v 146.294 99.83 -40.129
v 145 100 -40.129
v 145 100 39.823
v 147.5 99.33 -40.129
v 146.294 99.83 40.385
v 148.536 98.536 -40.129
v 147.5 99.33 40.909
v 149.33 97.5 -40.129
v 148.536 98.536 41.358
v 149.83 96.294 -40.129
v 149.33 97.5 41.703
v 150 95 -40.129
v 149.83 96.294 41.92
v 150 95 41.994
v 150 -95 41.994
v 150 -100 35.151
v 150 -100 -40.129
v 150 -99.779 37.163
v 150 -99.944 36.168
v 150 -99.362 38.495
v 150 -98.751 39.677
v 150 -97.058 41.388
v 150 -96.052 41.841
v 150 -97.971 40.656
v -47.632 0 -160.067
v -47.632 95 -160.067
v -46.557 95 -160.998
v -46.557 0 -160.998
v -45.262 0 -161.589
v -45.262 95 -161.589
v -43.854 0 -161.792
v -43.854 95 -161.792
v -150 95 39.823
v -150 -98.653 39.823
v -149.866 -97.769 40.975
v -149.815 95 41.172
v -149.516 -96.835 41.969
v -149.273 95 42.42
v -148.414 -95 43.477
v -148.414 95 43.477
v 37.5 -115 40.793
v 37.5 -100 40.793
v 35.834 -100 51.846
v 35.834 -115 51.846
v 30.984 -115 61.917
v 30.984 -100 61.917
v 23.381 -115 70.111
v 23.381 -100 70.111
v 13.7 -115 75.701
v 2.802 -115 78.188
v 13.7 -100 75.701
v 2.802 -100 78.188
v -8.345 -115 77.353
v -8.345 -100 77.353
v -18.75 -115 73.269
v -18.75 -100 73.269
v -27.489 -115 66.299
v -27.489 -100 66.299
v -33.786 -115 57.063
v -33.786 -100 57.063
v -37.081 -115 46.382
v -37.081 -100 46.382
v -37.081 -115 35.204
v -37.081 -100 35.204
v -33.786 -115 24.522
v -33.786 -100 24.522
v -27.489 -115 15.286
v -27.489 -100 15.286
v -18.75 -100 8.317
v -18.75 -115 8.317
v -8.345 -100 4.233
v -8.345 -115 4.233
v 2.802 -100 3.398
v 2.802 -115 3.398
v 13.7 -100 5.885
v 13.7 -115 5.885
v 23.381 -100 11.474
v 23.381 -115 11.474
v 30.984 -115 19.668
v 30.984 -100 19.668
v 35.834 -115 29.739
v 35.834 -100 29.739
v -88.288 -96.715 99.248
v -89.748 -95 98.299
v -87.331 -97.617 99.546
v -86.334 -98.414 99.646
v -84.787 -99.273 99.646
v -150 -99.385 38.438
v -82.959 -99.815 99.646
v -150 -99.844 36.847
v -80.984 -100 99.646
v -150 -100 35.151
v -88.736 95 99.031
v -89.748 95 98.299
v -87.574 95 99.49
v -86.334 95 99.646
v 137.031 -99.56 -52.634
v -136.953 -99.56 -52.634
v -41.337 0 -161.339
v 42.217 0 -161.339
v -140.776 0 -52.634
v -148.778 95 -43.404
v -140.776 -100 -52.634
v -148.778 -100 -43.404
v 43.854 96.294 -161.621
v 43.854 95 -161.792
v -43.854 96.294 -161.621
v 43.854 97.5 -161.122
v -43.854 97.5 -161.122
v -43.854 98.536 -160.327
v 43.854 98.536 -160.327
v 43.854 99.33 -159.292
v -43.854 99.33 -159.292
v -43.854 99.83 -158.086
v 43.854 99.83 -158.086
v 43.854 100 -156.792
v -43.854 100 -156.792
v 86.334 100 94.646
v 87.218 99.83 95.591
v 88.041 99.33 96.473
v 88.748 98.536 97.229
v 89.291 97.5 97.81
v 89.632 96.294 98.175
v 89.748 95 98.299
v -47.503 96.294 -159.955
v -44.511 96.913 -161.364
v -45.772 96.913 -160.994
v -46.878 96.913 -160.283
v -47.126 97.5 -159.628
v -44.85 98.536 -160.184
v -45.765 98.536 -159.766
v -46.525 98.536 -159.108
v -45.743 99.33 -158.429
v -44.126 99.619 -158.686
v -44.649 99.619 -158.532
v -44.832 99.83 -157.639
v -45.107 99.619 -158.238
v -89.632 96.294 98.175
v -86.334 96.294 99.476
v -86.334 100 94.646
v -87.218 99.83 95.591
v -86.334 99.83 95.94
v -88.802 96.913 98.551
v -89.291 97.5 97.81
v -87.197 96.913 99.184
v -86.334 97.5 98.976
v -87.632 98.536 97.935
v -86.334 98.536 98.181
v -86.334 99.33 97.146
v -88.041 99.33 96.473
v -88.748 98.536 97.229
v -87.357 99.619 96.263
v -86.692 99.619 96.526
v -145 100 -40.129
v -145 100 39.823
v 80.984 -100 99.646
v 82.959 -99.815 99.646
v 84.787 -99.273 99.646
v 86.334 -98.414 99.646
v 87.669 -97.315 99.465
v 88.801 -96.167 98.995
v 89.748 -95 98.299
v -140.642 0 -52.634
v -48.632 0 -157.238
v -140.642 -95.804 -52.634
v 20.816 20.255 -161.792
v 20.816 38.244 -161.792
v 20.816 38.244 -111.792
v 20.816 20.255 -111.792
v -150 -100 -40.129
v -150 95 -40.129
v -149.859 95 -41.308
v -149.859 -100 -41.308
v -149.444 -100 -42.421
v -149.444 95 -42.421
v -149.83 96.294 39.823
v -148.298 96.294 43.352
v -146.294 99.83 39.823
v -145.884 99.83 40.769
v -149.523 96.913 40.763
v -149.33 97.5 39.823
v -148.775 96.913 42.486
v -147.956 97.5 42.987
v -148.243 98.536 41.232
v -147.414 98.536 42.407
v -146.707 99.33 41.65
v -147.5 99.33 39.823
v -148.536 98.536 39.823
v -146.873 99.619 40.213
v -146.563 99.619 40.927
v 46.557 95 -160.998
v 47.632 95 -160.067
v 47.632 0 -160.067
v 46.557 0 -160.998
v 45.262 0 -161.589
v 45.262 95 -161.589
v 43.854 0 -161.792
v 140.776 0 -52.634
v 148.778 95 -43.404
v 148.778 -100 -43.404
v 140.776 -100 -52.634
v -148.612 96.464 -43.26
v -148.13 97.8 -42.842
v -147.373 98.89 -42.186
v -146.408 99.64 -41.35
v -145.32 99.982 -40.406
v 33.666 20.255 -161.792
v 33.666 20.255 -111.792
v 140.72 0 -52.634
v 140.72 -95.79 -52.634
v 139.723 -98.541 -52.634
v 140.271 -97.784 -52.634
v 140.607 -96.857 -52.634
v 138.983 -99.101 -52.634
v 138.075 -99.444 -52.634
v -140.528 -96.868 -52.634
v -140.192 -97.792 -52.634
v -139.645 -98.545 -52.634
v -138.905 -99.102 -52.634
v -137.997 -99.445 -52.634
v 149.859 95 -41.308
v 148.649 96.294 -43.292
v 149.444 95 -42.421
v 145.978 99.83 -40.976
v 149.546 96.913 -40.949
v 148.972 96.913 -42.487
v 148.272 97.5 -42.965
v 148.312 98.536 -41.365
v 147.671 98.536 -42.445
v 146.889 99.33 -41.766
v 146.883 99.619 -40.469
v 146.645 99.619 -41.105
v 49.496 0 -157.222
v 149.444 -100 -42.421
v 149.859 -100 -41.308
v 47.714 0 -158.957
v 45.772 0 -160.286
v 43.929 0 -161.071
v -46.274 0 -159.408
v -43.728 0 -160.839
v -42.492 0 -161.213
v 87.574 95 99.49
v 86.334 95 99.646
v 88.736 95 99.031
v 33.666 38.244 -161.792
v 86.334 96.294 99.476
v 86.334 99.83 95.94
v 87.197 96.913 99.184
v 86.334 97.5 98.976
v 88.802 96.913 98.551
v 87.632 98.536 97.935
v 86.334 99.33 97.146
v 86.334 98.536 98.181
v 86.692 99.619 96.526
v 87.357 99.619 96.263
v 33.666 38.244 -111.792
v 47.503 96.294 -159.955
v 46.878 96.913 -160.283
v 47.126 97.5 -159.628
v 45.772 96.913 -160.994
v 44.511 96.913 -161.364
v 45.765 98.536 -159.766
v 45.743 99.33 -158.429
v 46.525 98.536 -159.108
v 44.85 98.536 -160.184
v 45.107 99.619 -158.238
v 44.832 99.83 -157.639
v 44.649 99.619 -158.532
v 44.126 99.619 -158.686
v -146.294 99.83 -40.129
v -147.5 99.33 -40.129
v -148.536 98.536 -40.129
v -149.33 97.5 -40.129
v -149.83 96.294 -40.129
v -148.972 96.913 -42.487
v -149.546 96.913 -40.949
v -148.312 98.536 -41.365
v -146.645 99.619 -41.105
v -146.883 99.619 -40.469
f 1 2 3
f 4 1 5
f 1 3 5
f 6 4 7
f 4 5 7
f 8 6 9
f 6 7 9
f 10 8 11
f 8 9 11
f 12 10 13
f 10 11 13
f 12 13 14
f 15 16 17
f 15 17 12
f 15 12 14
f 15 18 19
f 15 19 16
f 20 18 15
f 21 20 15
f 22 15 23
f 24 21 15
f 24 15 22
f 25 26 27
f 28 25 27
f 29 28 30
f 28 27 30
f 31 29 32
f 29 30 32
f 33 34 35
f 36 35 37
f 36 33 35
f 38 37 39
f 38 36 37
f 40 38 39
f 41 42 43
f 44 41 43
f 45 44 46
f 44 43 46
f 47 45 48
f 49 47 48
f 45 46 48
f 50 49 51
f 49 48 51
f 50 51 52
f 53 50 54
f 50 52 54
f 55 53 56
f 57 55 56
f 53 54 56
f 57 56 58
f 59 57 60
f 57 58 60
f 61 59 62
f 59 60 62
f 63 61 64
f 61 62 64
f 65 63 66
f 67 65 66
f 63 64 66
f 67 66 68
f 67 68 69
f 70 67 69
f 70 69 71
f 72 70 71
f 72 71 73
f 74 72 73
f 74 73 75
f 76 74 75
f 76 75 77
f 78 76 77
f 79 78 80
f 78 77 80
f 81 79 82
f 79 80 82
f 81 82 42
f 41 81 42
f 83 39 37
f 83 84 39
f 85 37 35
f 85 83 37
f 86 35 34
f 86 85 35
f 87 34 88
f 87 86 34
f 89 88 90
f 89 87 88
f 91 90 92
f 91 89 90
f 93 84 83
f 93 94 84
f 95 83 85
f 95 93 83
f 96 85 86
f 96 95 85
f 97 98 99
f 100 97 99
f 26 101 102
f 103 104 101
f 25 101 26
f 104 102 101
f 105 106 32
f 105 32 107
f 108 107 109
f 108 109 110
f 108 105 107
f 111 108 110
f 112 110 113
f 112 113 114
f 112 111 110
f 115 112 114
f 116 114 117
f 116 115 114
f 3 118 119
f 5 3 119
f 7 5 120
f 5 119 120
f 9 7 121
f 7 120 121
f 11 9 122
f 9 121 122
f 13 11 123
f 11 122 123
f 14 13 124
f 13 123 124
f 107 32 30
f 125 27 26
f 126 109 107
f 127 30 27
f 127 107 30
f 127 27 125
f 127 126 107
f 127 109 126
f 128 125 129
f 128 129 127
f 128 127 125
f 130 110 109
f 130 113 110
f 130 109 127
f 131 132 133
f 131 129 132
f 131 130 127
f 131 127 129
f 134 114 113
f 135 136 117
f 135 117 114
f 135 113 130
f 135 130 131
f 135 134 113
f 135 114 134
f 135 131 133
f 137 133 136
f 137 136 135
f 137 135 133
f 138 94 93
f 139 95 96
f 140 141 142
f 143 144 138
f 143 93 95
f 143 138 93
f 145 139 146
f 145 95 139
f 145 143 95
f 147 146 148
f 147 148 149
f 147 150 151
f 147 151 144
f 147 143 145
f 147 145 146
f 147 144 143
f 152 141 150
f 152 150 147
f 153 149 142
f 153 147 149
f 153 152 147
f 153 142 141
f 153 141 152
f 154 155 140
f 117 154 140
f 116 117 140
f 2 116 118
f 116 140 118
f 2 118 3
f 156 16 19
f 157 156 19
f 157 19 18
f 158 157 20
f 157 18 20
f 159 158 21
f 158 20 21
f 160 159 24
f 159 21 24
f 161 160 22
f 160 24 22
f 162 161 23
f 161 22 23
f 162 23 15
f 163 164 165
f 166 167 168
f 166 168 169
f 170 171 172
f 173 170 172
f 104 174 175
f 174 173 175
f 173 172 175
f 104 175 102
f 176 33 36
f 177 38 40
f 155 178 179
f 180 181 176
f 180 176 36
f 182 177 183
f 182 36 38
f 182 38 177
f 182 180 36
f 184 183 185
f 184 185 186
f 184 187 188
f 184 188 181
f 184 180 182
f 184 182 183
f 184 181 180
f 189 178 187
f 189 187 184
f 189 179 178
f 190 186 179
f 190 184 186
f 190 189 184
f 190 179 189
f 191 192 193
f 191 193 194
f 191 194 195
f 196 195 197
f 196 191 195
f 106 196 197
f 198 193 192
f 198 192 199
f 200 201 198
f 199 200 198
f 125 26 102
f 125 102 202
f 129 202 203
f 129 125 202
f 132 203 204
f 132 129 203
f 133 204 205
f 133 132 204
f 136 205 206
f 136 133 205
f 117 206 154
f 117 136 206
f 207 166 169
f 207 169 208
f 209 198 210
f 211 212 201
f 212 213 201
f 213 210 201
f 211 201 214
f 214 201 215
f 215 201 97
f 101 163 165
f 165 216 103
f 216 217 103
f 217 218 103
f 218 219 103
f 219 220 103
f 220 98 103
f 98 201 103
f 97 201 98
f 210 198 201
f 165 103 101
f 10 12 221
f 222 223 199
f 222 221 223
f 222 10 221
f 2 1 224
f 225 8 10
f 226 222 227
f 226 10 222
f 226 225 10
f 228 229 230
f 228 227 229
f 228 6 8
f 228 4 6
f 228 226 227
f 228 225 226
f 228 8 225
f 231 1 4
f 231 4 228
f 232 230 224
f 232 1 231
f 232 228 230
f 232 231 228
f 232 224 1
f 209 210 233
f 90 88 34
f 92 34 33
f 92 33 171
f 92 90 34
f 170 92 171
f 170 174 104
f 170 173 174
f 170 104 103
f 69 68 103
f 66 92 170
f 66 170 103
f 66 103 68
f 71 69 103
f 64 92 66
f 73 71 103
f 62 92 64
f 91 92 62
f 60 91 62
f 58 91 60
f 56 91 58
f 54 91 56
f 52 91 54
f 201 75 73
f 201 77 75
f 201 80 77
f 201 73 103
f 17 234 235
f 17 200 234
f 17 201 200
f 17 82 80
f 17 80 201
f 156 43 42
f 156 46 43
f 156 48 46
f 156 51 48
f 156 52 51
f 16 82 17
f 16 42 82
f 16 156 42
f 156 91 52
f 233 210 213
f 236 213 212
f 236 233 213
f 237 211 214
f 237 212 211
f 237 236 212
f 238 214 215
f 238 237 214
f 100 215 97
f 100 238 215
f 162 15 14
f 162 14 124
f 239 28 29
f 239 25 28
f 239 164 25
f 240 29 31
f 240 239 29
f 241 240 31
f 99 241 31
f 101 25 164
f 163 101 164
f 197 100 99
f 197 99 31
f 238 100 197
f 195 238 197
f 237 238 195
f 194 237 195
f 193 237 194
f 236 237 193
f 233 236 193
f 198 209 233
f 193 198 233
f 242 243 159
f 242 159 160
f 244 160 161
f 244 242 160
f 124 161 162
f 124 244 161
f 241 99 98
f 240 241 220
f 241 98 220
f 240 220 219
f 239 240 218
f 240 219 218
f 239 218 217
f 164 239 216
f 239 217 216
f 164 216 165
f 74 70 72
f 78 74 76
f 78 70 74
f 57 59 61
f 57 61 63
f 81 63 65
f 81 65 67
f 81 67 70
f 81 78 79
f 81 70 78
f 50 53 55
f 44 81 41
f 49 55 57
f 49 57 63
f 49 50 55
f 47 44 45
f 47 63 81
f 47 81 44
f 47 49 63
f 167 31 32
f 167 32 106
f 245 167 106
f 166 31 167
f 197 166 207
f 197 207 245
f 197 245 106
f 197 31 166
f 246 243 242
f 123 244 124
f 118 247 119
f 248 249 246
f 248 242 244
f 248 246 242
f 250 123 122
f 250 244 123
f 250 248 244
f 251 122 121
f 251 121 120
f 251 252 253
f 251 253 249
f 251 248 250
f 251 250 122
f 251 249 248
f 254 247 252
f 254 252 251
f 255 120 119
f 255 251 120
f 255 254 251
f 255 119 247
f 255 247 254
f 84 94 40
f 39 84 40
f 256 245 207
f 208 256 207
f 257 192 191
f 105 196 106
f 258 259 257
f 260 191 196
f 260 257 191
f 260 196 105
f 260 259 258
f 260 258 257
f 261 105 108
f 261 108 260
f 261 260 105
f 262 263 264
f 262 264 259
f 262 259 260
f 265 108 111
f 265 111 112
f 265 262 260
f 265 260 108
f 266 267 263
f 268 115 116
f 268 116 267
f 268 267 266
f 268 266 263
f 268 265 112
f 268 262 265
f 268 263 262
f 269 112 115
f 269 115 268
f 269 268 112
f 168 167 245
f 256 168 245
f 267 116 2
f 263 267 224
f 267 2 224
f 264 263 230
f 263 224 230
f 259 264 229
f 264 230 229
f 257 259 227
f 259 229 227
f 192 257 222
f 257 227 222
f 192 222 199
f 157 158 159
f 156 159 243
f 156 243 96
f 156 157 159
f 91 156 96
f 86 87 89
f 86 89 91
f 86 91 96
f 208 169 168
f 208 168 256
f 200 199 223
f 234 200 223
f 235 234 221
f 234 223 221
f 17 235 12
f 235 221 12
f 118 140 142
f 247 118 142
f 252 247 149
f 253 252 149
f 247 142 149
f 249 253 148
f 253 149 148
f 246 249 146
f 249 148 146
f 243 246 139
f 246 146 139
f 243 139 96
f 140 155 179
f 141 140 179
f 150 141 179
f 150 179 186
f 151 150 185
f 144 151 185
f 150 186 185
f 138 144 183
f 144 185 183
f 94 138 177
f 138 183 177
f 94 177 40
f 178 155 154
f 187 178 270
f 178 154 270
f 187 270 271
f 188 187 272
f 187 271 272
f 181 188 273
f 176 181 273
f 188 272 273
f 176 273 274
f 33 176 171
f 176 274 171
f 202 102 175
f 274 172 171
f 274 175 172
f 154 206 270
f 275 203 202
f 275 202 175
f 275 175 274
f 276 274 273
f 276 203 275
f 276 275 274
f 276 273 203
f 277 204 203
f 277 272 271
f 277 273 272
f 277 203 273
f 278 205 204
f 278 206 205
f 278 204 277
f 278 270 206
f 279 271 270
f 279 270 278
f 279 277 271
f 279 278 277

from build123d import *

# Parameters (mm, degrees)
F0_W          = 92.273324728
F0_H          = 57.6515942812
F0_W_2        = 42.1701818705
F0_H_2        = 26.3371020555
F0_H_3        = 119.797244668
F0_H_4        = 35.8085483313
F1_DEPTH      = 100
F1_DEPTH_BACK = 100
F3_DEPTH      = 100
F5_DEPTH      = 150
F5_DEPTH_BACK = 150
F7_DEPTH      = 100
F8_R          = 5
F9_T1_DEPTH   = 199.6642420397
F9_T3_DEPTH   = 100.7064549822
F9_T5_DEPTH   = 109.4378575727
F9_T7_DEPTH   = 199.9314988793
F9_T9_DEPTH   = 109.4378575727
F9_T11_DEPTH  = 200.4273166446
F9_T16_DEPTH  = 5.1
F9_T22_DEPTH  = 5.1
F9_T28_DEPTH  = 5.1
F9_T34_DEPTH  = 5.1
F9_T40_DEPTH  = 5.1
F9_T46_DEPTH  = 5.1
F9_T52_DEPTH  = 5.1
F9_T58_DEPTH  = 190.7815844726
F9_T64_DEPTH  = 191.1757464634
F10_R         = 37.5
F11_DEPTH     = 15
F12_W         = 12.8494501114
F12_H         = 17.9891586304
F13_DEPTH     = 50


# Not quite as in the source:
# - a fillet or chamfer that OpenCascade refuses, or shapes differently, is made with other operations: its cross-section is extruded or revolved along the edge and cut away or added


with BuildPart() as f1:
    # F0 (on Front) → F1 (new body, two sides)
    with BuildSketch(Plane.XZ) as f1_sk:
        with Locations((0, 13.1685510278)):
            Rectangle(F0_W, F0_H)
        with Locations((-67.2217532992, 13.1685510278)):
            Rectangle(F0_W_2, F0_H)
        Polygon((-150, 41.9943481684), (-150, -41.9943481684), (-46.136662364, -41.9943481684), (-46.136662364, -15.6572461128), (-88.3068442345, -15.6572461128), (-88.3068442345, 41.9943481684), align=None)
        with Locations((0, -28.8257971406)):
            Rectangle(F0_W, F0_H_2)
        Polygon((46.136662364, -15.6572461128), (46.136662364, -41.9943481684), (150, -41.9943481684), (150, 41.9943481684), (88.3068442345, 41.9943481684), (88.3068442345, -15.6572461128), align=None)
        with Locations((67.2217532992, 13.1685510278)):
            Rectangle(F0_W_2, F0_H)
        Polygon((-46.136662364, -41.9943481684), (-150, -41.9943481684), (-46.136662364, -161.7915928364), align=None)
        with Locations((0, -101.8929705024)):
            Rectangle(F0_W, F0_H_3)
        Polygon((150, -41.9943481684), (46.136662364, -41.9943481684), (46.136662364, -161.7915928364), align=None)
        Polygon((-88.3068442345, 99.6459424496), (-88.3068442345, 41.9943481684), (-46.136662364, 41.9943481684), (-46.136662364, 77.8028964996), (46.136662364, 77.8028964996), (46.136662364, 41.9943481684), (88.3068442345, 41.9943481684), (88.3068442345, 99.6459424496), align=None)
        with Locations((0, 59.898622334)):
            Rectangle(F0_W, F0_H_4)
        Polygon((-88.3068442345, 99.6459424496), (-150, 41.9943481684), (-88.3068442345, 41.9943481684), align=None)
        Polygon((150, 41.9943481684), (88.3068442345, 99.6459424496), (88.3068442345, 41.9943481684), align=None)
    extrude(amount=F1_DEPTH)
    extrude(f1_sk.sketch, amount=-F1_DEPTH_BACK)

    # F2 (on face) → F3 (cut)
    with BuildSketch(Plane.XZ.offset(100)):
        Polygon((140.7758174747, -52.633633175), (-140.7758174747, -52.633633175), (-46.136662364, -161.7915928364), (46.136662364, -161.7915928364), align=None)
    extrude(amount=-F3_DEPTH, mode=Mode.SUBTRACT)

    # F4 (on Right) → F5 (join, two sides)
    with BuildSketch(Plane.YZ) as f5_sk:
        Polygon((-99.6227860451, -52.5650829077), (0, -161.33877635), (0, -52.5650829077), align=None)
    extrude(amount=F5_DEPTH)
    extrude(f5_sk.sketch, amount=-F5_DEPTH_BACK)

    # F6 (on face) → F7 (cut)
    with BuildSketch(Plane.XZ.offset(100)):
        Polygon((-140.7758174747, -52.633633175), (-150, -41.9943481684), (-150.5579352379, -161.6920530796), (-44.7144806385, -161.6920530796), (-140.6417366282, -52.633633175), align=None)
        Polygon((140.7758174747, -52.633633175), (140.7202282019, -52.633633175), (45.5975532532, -161.6920530796), (150, -161.6920530796), (150, -41.9943481684), align=None)
    extrude(amount=-F7_DEPTH, mode=Mode.SUBTRACT)

    # F8
    f8_edges = [f1.edges().sort_by_distance(p)[0] for p in [
        (0, 100, 99.645942),
        (119.153422, 100, 70.820145),
        (-150, 100, 0),
        (-98.068331, 100, -101.892971),
        (0, 100, -161.791593),
        (98.068331, 100, -101.892971),
        (150, 100, 0),
        (-119.153422, 100, 70.820145),
    ]]
    fillet(f8_edges, radius=F8_R)

    # F9: fillet of radius 5 on 11 edges, made by hand

    # F9_s2 → F9_t1 (cut)
    with BuildSketch(Plane.XZ.offset(-95)):
        with BuildLine():
            ThreePointArc((148.7778357345, -43.4040073885), (149.6845052392, -41.8766246542), (150, -40.1286513525))
            Line((150, -40.1286513525), (150, -41.9943481684))
            Line((150, -41.9943481684), (148.7778357345, -43.4040073885))
        make_face()
        with BuildLine():
            ThreePointArc((-150, -40.1286513525), (-149.6845052392, -41.8766246542), (-148.7778357345, -43.4040073885))
            Line((-148.7778357345, -43.4040073885), (-150, -41.9943481684))
            Line((-150, -41.9943481684), (-150, -40.1286513525))
        make_face()
    extrude(amount=F9_T1_DEPTH, mode=Mode.SUBTRACT)

    # F9_s4 → F9_t3 (cut)
    with BuildSketch(Plane.XZ.offset(-95)):
        with BuildLine():
            ThreePointArc((47.6319161056, -160.0669488724), (45.9305220173, -161.3400420326), (43.8540803711, -161.7915928364))
            Line((43.8540803711, -161.7915928364), (46.136662364, -161.7915928364))
            Line((46.136662364, -161.7915928364), (47.6319161056, -160.0669488724))
        make_face()
        with BuildLine():
            ThreePointArc((-47.6319161056, -160.0669488724), (-45.9305220173, -161.3400420326), (-43.8540803711, -161.7915928364))
            Line((-43.8540803711, -161.7915928364), (-46.136662364, -161.7915928364))
            Line((-46.136662364, -161.7915928364), (-47.6319161056, -160.0669488724))
        make_face()
    extrude(amount=F9_T3_DEPTH, mode=Mode.SUBTRACT)

    # F9_s6 → F9_t5 (cut)
    with BuildSketch(Plane(origin=(68.2577235686, 0, -63.786112688), x_dir=(0, 1, 0), z_dir=(-0.7306338358, 0, 0.6827695057))):
        with BuildLine():
            ThreePointArc((-100, -128.0979175463), (-98.5355339059, -131.6334514522), (-95, -133.0979175463))
            Line((-95, -133.0979175463), (-100, -133.0979175463))
            Line((-100, -133.0979175463), (-100, -128.0979175463))
        make_face()
    extrude(amount=F9_T5_DEPTH, mode=Mode.SUBTRACT)

    # F9_s8 → F9_t7 (cut)
    with BuildSketch(Plane.XZ.offset(-95)):
        with BuildLine():
            ThreePointArc((86.3342446827, 99.6459424496), (88.1692043696, 99.2970630616), (89.7480922115, 98.2991116286))
            Line((89.7480922115, 98.2991116286), (88.3068442345, 99.6459424496))
            Line((88.3068442345, 99.6459424496), (86.3342446827, 99.6459424496))
        make_face()
        with BuildLine():
            ThreePointArc((-89.7480922115, 98.2991116286), (-88.1692043696, 99.2970630616), (-86.3342446827, 99.6459424496))
            Line((-86.3342446827, 99.6459424496), (-88.3068442345, 99.6459424496))
            Line((-88.3068442345, 99.6459424496), (-89.7480922115, 98.2991116286))
        make_face()
    extrude(amount=F9_T7_DEPTH, mode=Mode.SUBTRACT)

    # F9_s10 → F9_t9 (cut)
    with BuildSketch(Plane(origin=(11.701278092, 0, 10.9347192369), x_dir=(0, 1, 0), z_dir=(-0.7306338358, 0, -0.6827695057))):
        with BuildLine():
            ThreePointArc((-95, -133.0979175463), (-98.5355339059, -131.6334514522), (-100, -128.0979175463))
            Line((-100, -128.0979175463), (-100, -133.0979175463))
            Line((-100, -133.0979175463), (-95, -133.0979175463))
        make_face()
    extrude(amount=F9_T9_DEPTH, mode=Mode.SUBTRACT)

    # F9_s12 → F9_t11 (cut)
    with BuildSketch(Plane.XZ.offset(-95)):
        with BuildLine():
            ThreePointArc((-150, 39.8234215105), (-149.5863513627, 41.8147479976), (-148.4138475287, 43.4765906896))
            Line((-148.4138475287, 43.4765906896), (-150, 41.9943481684))
            Line((-150, 41.9943481684), (-150, 39.8234215105))
        make_face()
    extrude(amount=F9_T11_DEPTH, mode=Mode.SUBTRACT)


with BuildPart() as f9_tool14:
    # F9_s15 → F9_t16 (new body)
    with BuildSketch(Plane.XZ.offset(-95)):
        Polygon((-43.8540803711, -156.7915928364), (-47.7074728203, -160.1324559932), (-46.1823140039, -161.8915928364), (-43.8540803711, -161.8915928364), align=None)
    extrude(amount=-F9_T16_DEPTH)

    # F9_s17 → F9_t18 (revolve, cut)
    with BuildSketch(Plane(origin=(-43.8540803711, 95, -156.7915928364), x_dir=(0.4152883292, 0, 0.9096898392), z_dir=(-0.9096898392, 0, 0.4152883292))):
        with BuildLine():
            ThreePointArc((0, -5), (5, 0), (0, 5))
            Line((0, 5), (0, -5))
        make_face()
    revolve(axis=Axis((-43.8540803711, 95, -156.7915928364), (0, 1, 0)), mode=Mode.SUBTRACT)


with BuildPart() as f1_1:
    add(f1.part)

    # F9_t13: cut F9_tool14
    add(f9_tool14.part, mode=Mode.SUBTRACT)


with BuildPart() as f9_tool20:
    # F9_s21 → F9_t22 (new body)
    with BuildSketch(Plane.XZ.offset(-95)):
        Polygon((-145, -40.1286513525), (-150.1, -40.1286513525), (-150.1, -42.0316621047), (-148.8533924492, -43.4695145093), align=None)
    extrude(amount=-F9_T22_DEPTH)

    # F9_s23 → F9_t24 (revolve, cut)
    with BuildSketch(Plane(origin=(-145, 95, -40.1286513525), x_dir=(0.9369010478, 0, 0.3495946604), z_dir=(-0.3495946604, 0, 0.9369010478))):
        with BuildLine():
            ThreePointArc((0, -5), (5, 0), (0, 5))
            Line((0, 5), (0, -5))
        make_face()
    revolve(axis=Axis((-145, 95, -40.1286513525), (0, 1, 0)), mode=Mode.SUBTRACT)


with BuildPart() as f1_2:
    add(f1_1.part)

    # F9_t19: cut F9_tool20
    add(f9_tool20.part, mode=Mode.SUBTRACT)


with BuildPart() as f9_tool26:
    # F9_s27 → F9_t28 (new body)
    with BuildSketch(Plane.XZ.offset(-95)):
        Polygon((-145, 39.8234215105), (-150.1, 39.8234215105), (-150.1, 42.0377667015), (-148.4821244793, 43.5496540731), align=None)
    extrude(amount=-F9_T28_DEPTH)

    # F9_s29 → F9_t30 (revolve, cut)
    with BuildSketch(Plane(origin=(-145, 95, 39.8234215105), x_dir=(0.9172702725, 0, -0.3982652974), z_dir=(0.3982652974, 0, 0.9172702725))):
        with BuildLine():
            ThreePointArc((0, -5), (5, 0), (0, 5))
            Line((0, 5), (0, -5))
        make_face()
    revolve(axis=Axis((-145, 95, 39.8234215105), (0, 1, 0)), mode=Mode.SUBTRACT)


with BuildPart() as f1_3:
    add(f1_2.part)

    # F9_t25: cut F9_tool26
    add(f9_tool26.part, mode=Mode.SUBTRACT)


with BuildPart() as f9_tool32:
    # F9_s33 → F9_t34 (new body)
    with BuildSketch(Plane.XZ.offset(-95)):
        Polygon((-86.3342446827, 94.6459424496), (-89.816369162, 98.3721750122), (-88.3462962255, 99.7459424496), (-86.3342446827, 99.7459424496), align=None)
    extrude(amount=-F9_T34_DEPTH)

    # F9_s35 → F9_t36 (revolve, cut)
    with BuildSketch(Plane(origin=(-86.3342446827, 95, 94.6459424496), x_dir=(0.3669919374, 0, -0.9302241224), z_dir=(0.9302241224, 0, 0.3669919374))):
        with BuildLine():
            ThreePointArc((0, -5), (5, 0), (0, 5))
            Line((0, 5), (0, -5))
        make_face()
    revolve(axis=Axis((-86.3342446827, 95, 94.6459424496), (0, 1, 0)), mode=Mode.SUBTRACT)


with BuildPart() as f1_4:
    add(f1_3.part)

    # F9_t31: cut F9_tool32
    add(f9_tool32.part, mode=Mode.SUBTRACT)


with BuildPart() as f9_tool38:
    # F9_s39 → F9_t40 (new body)
    with BuildSketch(Plane.XZ.offset(-95)):
        Polygon((86.3342446827, 94.6459424496), (86.3342446827, 99.7459424496), (88.3462962255, 99.7459424496), (89.816369162, 98.3721750122), align=None)
    extrude(amount=-F9_T40_DEPTH)

    # F9_s41 → F9_t42 (revolve, cut)
    with BuildSketch(Plane(origin=(86.3342446827, 95, 94.6459424496), x_dir=(-0.3669919374, 0, -0.9302241224), z_dir=(0.9302241224, 0, -0.3669919374))):
        with BuildLine():
            ThreePointArc((0, -5), (5, 0), (0, 5))
            Line((0, 5), (0, -5))
        make_face()
    revolve(axis=Axis((86.3342446827, 95, 94.6459424496), (0, 1, 0)), mode=Mode.SUBTRACT)


with BuildPart() as f1_5:
    add(f1_4.part)

    # F9_t37: cut F9_tool38
    add(f9_tool38.part, mode=Mode.SUBTRACT)


with BuildPart() as f9_tool44:
    # F9_s45 → F9_t46 (new body)
    with BuildSketch(Plane.XZ.offset(-95)):
        Polygon((43.8540803711, -156.7915928364), (47.7074728203, -160.1324559932), (46.1823140039, -161.8915928364), (43.8540803711, -161.8915928364), align=None)
    extrude(amount=-F9_T46_DEPTH)

    # F9_s47 → F9_t48 (revolve, cut)
    with BuildSketch(Plane(origin=(43.8540803711, 95, -156.7915928364), x_dir=(-0.4152883292, 0, 0.9096898392), z_dir=(-0.9096898392, 0, -0.4152883292))):
        with BuildLine():
            ThreePointArc((0, -5), (5, 0), (0, 5))
            Line((0, 5), (0, -5))
        make_face()
    revolve(axis=Axis((43.8540803711, 95, -156.7915928364), (0, 1, 0)), mode=Mode.SUBTRACT)


with BuildPart() as f1_6:
    add(f1_5.part)

    # F9_t43: cut F9_tool44
    add(f9_tool44.part, mode=Mode.SUBTRACT)


with BuildPart() as f9_tool50:
    # F9_s51 → F9_t52 (new body)
    with BuildSketch(Plane.XZ.offset(-95)):
        Polygon((145, -40.1286513525), (148.8533924492, -43.4695145093), (150.1, -42.0316621047), (150.1, -40.1286513525), align=None)
    extrude(amount=-F9_T52_DEPTH)

    # F9_s53 → F9_t54 (revolve, cut)
    with BuildSketch(Plane(origin=(145, 95, -40.1286513525), x_dir=(-0.9369010478, 0, 0.3495946604), z_dir=(-0.3495946604, 0, -0.9369010478))):
        with BuildLine():
            ThreePointArc((0, -5), (5, 0), (0, 5))
            Line((0, 5), (0, -5))
        make_face()
    revolve(axis=Axis((145, 95, -40.1286513525), (0, 1, 0)), mode=Mode.SUBTRACT)


with BuildPart() as f1_7:
    add(f1_6.part)

    # F9_t49: cut F9_tool50
    add(f9_tool50.part, mode=Mode.SUBTRACT)


with BuildPart() as f9_tool56:
    # F9_s57 → F9_t58 (new body)
    with BuildSketch(Plane(origin=(-44.8947175454, 47.1416954329, -51.4719225484), x_dir=(0.7241543113, 0.6896379727, 0), z_dir=(0.5409695578, -0.5680450514, 0.6202231511))):
        with BuildLine():
            ThreePointArc((35.8427850372, -144.5001725374), (33.2234593548, -145.3091827818), (30.5712639561, -144.6154795512))
            Line((30.5712639561, -144.6154795512), (33.2428014748, -146.1934515657))
            Line((33.2428014748, -146.1934515657), (35.8427850372, -144.5001725374))
        make_face()
    extrude(amount=F9_T58_DEPTH)

    split(bisect_by=Plane.XY.offset(-52.633633175), keep=Keep.BOTTOM)

    split(bisect_by=Plane.XZ, keep=Keep.TOP)


with BuildPart() as f1_8:
    add(f1_7.part)

    # F9_t55: cut F9_tool56
    add(f9_tool56.part, mode=Mode.SUBTRACT)


with BuildPart() as f9_tool62:
    # F9_s63 → F9_t64 (new body)
    with BuildSketch(Plane(origin=(-58.840223556, -61.2669557127, 66.8946666059), x_dir=(-0.7212464746, 0.6926785134, 0), z_dir=(0.544194194, 0.5666382547, -0.6186871323))):
        with BuildLine():
            ThreePointArc((29.8139114642, -144.4686613021), (32.4583698037, -145.1693847909), (35.0757673211, -144.3735182485))
            Line((35.0757673211, -144.3735182485), (32.4742820088, -146.0494041555))
            Line((32.4742820088, -146.0494041555), (29.8139114642, -144.4686613021))
        make_face()
    extrude(amount=F9_T64_DEPTH)

    split(bisect_by=Plane.XY.offset(-52.633633175), keep=Keep.BOTTOM)

    split(bisect_by=Plane.XZ, keep=Keep.TOP)


with BuildPart() as f1_9:
    add(f1_8.part)

    # F9_t61: cut F9_tool62
    add(f9_tool62.part, mode=Mode.SUBTRACT)

    # F10 (on face) → F11 (join)
    with BuildSketch(Plane.XZ.offset(100)):
        with Locations((0, 40.7927632332)):
            Circle(F10_R)
    extrude(amount=F11_DEPTH)

    # F12 (on face) → F13 (cut)
    with BuildSketch(Plane(origin=(0, 0, -161.7915928364), x_dir=(1, 0, 0), z_dir=(0, 0, -1))):
        with Locations((27.2407829762, -29.2492955923)):
            Rectangle(F12_W, F12_H)
    extrude(amount=-F13_DEPTH, mode=Mode.SUBTRACT)


solid = f1_9.part
